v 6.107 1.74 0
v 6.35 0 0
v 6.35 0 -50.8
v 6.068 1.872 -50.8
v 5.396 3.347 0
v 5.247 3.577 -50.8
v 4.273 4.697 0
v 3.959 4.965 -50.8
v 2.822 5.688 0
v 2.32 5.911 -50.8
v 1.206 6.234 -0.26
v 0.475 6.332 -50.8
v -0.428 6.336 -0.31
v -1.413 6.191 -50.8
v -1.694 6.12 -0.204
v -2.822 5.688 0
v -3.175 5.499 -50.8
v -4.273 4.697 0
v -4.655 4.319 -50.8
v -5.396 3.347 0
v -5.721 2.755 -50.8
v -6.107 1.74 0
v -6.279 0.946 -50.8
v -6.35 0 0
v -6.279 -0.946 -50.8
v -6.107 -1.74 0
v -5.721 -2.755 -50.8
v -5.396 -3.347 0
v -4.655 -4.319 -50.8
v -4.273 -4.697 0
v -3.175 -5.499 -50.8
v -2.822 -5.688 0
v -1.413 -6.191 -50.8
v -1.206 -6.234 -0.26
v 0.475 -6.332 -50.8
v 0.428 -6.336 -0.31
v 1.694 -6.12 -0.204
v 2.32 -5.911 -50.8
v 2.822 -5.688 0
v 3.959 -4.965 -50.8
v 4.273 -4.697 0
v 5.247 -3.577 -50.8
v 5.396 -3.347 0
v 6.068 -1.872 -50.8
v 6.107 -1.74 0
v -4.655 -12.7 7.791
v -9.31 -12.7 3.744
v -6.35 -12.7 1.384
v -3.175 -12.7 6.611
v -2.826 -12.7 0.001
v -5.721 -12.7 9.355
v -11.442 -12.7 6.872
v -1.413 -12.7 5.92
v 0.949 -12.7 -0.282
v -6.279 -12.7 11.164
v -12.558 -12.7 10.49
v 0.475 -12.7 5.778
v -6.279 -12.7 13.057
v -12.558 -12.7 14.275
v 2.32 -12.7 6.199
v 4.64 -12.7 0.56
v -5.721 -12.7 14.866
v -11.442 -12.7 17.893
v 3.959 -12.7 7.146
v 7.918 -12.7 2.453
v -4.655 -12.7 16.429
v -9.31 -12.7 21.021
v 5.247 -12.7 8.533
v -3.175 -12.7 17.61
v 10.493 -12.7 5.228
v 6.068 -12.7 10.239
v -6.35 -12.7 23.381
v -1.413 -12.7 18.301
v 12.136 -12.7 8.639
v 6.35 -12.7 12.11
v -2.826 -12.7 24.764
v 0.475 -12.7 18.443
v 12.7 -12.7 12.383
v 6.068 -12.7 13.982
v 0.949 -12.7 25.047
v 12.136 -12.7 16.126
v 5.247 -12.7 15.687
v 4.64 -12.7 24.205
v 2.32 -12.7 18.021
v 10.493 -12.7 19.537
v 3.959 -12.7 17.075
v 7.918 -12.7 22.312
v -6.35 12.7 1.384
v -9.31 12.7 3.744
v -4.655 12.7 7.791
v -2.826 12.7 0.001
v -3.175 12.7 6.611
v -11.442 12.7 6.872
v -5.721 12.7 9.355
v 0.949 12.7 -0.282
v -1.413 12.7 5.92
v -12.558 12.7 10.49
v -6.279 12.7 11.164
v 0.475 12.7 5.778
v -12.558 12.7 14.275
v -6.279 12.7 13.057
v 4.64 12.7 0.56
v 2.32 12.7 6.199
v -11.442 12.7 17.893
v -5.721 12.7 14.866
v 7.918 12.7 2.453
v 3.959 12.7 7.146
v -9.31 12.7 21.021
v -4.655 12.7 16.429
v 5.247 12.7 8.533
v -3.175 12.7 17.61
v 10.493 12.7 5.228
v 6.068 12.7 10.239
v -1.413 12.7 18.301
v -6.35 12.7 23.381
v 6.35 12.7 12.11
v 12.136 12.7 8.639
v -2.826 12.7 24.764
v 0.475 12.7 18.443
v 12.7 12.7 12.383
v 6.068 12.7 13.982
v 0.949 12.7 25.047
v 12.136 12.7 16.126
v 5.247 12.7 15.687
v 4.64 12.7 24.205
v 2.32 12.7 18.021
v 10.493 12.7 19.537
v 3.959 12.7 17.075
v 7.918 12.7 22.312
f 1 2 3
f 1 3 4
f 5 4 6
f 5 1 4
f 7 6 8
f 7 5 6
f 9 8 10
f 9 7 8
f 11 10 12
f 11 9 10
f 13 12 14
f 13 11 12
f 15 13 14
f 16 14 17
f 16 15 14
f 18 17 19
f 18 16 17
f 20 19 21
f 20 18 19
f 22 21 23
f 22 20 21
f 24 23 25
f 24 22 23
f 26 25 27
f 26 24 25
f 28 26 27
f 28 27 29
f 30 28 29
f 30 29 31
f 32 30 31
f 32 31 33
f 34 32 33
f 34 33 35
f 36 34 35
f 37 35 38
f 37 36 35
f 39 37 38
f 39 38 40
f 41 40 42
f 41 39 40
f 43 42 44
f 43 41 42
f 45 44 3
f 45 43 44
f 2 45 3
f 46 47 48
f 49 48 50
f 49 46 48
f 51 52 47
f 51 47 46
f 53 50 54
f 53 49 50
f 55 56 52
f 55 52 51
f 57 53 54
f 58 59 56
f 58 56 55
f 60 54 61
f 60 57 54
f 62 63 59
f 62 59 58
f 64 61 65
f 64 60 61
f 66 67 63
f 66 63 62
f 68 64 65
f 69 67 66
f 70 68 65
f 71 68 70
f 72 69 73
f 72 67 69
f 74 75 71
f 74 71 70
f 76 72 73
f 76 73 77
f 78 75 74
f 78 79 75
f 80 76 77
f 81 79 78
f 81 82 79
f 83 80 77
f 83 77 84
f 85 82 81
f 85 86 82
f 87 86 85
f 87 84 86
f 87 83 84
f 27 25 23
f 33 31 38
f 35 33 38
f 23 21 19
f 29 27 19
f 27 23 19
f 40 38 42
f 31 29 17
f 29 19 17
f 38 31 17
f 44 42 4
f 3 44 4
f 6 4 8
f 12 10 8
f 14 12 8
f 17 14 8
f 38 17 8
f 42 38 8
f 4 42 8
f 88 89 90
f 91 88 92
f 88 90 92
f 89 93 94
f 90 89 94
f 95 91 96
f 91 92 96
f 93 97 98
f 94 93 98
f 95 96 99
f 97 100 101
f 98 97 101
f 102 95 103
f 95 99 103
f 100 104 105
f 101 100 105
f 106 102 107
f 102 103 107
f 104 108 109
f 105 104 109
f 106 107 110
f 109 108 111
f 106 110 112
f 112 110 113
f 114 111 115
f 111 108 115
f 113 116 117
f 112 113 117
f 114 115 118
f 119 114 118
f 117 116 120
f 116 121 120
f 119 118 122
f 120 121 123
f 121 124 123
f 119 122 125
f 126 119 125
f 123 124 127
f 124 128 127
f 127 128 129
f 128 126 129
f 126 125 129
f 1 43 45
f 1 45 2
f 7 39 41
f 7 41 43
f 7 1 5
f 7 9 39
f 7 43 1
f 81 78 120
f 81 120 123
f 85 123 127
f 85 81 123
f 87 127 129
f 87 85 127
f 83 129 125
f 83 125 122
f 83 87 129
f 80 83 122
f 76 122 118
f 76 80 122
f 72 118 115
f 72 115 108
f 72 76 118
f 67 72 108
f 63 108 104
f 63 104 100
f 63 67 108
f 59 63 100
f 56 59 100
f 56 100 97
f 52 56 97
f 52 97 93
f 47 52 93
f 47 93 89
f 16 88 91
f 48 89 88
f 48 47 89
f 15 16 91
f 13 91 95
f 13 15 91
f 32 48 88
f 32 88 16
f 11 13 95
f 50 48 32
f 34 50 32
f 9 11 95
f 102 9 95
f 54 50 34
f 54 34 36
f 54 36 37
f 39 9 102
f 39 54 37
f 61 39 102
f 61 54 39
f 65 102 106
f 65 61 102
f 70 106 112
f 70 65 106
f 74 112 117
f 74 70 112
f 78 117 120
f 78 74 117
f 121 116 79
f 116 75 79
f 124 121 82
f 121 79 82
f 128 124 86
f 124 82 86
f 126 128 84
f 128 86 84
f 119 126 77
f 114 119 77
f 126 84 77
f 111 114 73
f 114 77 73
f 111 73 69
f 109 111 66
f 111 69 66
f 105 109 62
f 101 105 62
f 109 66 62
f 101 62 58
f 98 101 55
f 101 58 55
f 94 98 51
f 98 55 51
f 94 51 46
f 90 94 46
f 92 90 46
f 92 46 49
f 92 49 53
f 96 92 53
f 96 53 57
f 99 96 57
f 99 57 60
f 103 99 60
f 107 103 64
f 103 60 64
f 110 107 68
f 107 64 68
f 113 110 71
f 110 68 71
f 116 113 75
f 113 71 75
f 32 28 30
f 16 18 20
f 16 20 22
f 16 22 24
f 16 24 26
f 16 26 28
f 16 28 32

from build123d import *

# Parameters (mm, degrees)
F0_R     = 6.35
F1_DEPTH = 50.8
F2_R     = 12.7
F3_DEPTH = 12.7
F4_R     = 6.35
F5_DEPTH = 12.7


with BuildPart() as f1:
    # F0 (on Top) → F1 (new body)
    with BuildSketch(Plane.XY):
        Circle(F0_R)
    extrude(amount=-F1_DEPTH)

    # F2 (on Front) → F3 (join, symmetric)
    with BuildSketch(Plane.XZ):
        with Locations((0, 12.382501)):
            Circle(F2_R)
    extrude(amount=F3_DEPTH, both=True)

    # F4 (on Front) → F5 (cut, symmetric)
    with BuildSketch(Plane.XZ):
        with Locations((0, 12.110357)):
            Circle(F4_R)
    extrude(amount=F5_DEPTH, both=True, mode=Mode.SUBTRACT)


solid = f1.part
